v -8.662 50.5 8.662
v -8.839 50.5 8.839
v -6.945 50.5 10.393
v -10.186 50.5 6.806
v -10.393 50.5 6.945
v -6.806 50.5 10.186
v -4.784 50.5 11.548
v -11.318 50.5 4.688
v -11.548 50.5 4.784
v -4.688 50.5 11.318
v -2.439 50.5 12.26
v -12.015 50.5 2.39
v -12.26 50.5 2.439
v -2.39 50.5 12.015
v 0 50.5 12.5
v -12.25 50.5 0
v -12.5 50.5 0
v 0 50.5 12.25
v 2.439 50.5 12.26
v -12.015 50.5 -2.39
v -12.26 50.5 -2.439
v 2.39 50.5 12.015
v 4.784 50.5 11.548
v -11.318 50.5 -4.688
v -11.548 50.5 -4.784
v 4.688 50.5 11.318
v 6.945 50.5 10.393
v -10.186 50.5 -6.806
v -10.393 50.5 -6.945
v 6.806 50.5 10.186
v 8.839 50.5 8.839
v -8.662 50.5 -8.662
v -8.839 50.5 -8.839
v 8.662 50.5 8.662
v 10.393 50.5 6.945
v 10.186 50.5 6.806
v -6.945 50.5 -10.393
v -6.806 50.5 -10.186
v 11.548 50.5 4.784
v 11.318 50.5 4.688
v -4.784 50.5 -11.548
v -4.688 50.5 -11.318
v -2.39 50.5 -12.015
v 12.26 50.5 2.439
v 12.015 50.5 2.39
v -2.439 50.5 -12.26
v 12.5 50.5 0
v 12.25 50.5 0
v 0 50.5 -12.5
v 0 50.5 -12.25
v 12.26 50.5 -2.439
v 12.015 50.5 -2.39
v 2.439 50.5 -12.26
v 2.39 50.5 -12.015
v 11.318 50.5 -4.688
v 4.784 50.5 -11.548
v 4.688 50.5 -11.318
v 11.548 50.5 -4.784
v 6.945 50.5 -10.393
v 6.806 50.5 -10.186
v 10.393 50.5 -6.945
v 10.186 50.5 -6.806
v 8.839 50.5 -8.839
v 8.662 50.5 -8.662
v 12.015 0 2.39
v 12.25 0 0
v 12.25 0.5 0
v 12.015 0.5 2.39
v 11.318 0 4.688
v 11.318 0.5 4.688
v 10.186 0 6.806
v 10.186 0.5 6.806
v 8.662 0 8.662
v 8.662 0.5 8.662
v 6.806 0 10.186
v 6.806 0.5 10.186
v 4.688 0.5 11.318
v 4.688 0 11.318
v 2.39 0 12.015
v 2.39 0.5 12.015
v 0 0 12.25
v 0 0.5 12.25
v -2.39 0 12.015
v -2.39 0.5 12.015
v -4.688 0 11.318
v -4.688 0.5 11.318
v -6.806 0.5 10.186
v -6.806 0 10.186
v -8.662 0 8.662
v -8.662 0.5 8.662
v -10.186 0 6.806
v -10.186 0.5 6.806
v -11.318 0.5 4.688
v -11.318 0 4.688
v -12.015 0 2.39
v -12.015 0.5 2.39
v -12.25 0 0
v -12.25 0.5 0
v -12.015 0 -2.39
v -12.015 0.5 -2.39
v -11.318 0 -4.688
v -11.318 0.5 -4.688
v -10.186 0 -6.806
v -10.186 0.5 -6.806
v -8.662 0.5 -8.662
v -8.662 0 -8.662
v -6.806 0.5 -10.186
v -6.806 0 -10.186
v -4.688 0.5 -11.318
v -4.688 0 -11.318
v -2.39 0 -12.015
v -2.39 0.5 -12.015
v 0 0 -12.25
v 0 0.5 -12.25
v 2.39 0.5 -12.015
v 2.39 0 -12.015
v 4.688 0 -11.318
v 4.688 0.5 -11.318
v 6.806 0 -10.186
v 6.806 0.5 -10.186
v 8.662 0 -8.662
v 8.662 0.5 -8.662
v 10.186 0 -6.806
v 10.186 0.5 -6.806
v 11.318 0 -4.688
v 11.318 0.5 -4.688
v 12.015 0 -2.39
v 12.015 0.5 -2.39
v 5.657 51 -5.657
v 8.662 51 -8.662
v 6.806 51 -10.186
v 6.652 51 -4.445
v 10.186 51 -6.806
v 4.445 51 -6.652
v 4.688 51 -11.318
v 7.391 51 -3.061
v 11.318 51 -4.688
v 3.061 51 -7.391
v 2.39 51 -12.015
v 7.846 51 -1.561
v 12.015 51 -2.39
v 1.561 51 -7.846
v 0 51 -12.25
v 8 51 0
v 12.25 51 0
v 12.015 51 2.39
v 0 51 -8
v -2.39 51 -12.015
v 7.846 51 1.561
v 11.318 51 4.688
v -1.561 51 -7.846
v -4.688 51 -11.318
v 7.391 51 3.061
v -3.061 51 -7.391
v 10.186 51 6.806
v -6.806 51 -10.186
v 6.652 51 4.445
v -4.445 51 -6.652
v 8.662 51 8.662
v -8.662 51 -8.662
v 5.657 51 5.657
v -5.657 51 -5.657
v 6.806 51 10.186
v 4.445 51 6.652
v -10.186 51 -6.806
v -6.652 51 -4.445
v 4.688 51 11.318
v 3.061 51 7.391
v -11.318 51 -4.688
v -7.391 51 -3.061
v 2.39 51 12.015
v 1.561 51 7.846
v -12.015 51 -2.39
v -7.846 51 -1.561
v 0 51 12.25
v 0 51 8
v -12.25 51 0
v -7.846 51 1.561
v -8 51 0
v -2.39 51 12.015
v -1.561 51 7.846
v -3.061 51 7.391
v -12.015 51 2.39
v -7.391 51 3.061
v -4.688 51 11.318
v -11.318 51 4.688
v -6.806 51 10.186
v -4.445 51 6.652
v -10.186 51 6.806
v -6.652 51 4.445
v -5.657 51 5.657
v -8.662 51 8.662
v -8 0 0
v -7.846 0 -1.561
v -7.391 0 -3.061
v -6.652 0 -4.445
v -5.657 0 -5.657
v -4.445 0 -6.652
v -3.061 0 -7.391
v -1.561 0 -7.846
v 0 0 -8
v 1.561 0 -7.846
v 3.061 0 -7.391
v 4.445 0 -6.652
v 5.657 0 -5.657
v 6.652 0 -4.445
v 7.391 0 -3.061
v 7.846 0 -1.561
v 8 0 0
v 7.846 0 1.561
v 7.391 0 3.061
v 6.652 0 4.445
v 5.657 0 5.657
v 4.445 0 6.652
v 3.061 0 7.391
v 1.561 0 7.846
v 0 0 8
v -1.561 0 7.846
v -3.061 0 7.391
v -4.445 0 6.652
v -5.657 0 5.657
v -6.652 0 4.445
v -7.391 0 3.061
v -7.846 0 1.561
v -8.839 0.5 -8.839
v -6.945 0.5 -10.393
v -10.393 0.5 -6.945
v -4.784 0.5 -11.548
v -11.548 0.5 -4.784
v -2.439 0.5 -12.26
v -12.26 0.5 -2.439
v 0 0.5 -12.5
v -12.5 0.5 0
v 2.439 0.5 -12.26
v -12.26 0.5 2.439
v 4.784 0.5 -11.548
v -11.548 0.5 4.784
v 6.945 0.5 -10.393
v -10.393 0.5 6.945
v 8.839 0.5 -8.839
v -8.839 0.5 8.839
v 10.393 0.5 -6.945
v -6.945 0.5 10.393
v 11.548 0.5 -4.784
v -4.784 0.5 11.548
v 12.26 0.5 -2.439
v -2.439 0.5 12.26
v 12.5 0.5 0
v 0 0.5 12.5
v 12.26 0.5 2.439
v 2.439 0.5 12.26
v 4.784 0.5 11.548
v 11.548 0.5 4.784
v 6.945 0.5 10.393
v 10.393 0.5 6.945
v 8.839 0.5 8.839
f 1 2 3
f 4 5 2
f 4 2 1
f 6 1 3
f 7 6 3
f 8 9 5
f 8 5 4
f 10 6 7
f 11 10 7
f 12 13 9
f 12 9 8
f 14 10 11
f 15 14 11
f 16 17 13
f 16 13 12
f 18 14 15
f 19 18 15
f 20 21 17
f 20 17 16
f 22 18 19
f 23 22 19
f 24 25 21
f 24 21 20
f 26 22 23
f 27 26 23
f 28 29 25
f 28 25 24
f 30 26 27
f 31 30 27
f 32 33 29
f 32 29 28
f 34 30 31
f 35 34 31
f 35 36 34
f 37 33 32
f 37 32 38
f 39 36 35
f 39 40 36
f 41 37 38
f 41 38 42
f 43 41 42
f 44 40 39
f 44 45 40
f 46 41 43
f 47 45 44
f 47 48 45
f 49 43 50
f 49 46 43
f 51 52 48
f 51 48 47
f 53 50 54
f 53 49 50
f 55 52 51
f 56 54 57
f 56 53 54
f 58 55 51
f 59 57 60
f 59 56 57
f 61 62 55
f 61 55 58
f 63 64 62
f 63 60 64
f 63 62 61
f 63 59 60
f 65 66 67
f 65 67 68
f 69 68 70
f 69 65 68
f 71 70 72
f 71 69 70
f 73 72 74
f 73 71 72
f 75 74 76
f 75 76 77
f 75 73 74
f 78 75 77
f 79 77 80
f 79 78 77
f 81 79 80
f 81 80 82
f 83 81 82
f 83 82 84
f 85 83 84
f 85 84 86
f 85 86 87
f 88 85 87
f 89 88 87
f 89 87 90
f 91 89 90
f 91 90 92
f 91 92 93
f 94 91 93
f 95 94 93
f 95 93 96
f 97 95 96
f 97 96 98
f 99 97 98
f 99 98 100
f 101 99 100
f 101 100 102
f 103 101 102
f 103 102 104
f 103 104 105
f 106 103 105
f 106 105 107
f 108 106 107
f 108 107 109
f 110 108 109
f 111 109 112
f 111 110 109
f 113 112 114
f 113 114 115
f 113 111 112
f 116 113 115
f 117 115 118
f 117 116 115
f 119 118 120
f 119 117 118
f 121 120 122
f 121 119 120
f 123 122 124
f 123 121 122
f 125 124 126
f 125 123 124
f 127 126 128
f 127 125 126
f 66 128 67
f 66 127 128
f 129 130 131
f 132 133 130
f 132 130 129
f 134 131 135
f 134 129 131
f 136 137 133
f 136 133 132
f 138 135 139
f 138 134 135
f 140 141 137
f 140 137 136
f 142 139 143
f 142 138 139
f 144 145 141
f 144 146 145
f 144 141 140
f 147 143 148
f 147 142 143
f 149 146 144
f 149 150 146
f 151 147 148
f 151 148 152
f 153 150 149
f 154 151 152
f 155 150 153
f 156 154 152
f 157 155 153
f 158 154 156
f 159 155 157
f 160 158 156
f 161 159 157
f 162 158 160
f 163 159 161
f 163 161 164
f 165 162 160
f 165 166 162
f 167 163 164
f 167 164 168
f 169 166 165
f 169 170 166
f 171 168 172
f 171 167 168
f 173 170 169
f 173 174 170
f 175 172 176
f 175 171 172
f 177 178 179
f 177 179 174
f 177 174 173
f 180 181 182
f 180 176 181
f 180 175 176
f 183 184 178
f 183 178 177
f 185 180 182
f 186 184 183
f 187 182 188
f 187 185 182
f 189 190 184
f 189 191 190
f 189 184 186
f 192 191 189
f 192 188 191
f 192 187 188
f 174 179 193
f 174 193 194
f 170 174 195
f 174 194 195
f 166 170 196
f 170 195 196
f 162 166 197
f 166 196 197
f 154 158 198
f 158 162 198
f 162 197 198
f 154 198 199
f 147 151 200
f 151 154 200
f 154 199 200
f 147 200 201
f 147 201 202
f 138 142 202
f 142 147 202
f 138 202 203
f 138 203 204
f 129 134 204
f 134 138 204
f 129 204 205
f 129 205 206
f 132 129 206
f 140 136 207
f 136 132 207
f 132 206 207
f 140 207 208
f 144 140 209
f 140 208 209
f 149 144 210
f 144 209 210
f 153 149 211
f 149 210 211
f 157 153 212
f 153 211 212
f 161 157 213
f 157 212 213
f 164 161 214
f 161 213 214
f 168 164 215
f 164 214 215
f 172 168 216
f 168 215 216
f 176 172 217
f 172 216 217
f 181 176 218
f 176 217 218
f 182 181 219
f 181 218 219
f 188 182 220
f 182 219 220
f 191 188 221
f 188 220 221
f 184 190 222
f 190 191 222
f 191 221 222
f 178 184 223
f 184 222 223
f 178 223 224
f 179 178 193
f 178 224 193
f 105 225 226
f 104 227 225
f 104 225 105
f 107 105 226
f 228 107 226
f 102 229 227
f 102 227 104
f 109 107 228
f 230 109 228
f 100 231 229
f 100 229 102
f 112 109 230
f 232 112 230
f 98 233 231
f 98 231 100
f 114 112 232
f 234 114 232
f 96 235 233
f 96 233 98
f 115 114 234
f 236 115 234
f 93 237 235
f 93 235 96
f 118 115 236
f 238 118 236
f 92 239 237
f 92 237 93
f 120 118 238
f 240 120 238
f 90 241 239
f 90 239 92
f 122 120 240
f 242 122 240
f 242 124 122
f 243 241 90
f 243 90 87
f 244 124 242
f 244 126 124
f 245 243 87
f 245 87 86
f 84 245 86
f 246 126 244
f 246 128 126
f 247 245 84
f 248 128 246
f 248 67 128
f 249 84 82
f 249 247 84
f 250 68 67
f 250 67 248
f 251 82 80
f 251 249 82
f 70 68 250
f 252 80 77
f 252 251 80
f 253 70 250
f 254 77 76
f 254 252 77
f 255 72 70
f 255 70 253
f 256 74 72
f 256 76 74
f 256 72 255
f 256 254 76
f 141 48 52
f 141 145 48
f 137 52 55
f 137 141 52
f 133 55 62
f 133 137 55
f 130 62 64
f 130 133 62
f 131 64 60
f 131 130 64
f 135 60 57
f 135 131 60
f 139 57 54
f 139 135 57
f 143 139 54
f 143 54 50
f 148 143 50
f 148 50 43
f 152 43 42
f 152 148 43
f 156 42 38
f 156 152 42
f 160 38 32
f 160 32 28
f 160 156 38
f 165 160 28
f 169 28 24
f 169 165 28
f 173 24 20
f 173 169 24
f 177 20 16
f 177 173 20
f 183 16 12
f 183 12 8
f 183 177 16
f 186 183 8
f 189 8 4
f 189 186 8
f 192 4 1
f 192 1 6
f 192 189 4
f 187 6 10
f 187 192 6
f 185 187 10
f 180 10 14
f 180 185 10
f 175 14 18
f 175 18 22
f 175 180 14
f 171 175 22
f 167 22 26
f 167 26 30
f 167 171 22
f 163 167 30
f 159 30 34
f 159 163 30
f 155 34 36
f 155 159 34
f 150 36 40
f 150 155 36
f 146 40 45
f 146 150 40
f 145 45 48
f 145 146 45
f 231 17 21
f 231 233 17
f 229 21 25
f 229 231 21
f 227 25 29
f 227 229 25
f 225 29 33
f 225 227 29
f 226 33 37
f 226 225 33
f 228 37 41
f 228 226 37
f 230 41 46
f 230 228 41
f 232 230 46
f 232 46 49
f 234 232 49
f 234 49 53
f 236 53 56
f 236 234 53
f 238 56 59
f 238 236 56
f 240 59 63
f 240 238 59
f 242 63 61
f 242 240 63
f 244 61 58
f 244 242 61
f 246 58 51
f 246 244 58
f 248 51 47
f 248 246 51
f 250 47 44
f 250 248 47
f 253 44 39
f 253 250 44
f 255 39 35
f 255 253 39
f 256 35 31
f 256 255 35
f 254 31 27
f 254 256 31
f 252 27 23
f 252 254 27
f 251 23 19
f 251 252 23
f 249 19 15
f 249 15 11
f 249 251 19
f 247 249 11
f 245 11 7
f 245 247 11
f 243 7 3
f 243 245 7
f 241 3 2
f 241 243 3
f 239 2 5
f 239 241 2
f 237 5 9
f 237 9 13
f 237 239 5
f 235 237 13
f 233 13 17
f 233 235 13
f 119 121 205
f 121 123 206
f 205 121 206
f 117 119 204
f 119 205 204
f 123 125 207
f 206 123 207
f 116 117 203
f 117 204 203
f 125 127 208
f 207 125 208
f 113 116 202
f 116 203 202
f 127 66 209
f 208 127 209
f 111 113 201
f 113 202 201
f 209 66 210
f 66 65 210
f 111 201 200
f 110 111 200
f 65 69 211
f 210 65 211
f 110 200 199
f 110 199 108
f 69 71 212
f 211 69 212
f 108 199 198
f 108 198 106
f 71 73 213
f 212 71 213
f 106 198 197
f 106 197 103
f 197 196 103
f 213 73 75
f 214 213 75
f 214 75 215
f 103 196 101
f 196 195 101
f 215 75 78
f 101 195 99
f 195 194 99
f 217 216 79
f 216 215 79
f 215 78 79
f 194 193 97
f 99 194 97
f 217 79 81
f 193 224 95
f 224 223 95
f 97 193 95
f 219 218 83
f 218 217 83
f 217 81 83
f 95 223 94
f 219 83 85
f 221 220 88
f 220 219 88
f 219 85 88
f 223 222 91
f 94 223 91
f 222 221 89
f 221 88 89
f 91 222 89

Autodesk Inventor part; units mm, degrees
ref_plane "YZ Plane" through (0, 0, 0) normal (1, 0, 0) x (0, 1, 0)
ref_plane "XZ Plane" through (0, 0, 0) normal (0, 1, 0) x (-1, 0, 0)
ref_plane "XY Plane" through (0, 0, 0) normal (0, 0, 1) x (1, 0, 0)
sketch "Sketch1" plane through (0, 0, 0) normal (0, 1, 0) x (-1, 0, 0)
  circle A0 centre (0, 0) radius 12.5
  circle A1 centre (0, 0) radius 8
  dimension "d0" = 25
  dimension "d1" = 16
extrude "Extrusion1" add sketch "Sketch1" along normal blind 51
sketch "Sketch2" plane through (0, 51, 0) normal (0, 1, 0) x (1, 0, 0)
  circle A0 centre (0, 0) radius 12.25
  circle A1 centre (0, 0) radius 12.5 projected
  dimension "d4" = 24.5
extrude "Extrusion2" cut sketch "Sketch2" against normal blind 0.5
sketch "Sketch3" plane through (0, 0, 0) normal (0, -1, 0) x (1, 0, 0)
  circle A0 centre (0, 0) radius 12.25
  circle A1 centre (0, 0) radius 12.5 projected
  dimension "d7" = 24.5
extrude "Extrusion3" cut sketch "Sketch3" against normal blind 0.5
properties part number "P-025.40H Piezo Ring Actuators" material "Porcelain, Ivory"
